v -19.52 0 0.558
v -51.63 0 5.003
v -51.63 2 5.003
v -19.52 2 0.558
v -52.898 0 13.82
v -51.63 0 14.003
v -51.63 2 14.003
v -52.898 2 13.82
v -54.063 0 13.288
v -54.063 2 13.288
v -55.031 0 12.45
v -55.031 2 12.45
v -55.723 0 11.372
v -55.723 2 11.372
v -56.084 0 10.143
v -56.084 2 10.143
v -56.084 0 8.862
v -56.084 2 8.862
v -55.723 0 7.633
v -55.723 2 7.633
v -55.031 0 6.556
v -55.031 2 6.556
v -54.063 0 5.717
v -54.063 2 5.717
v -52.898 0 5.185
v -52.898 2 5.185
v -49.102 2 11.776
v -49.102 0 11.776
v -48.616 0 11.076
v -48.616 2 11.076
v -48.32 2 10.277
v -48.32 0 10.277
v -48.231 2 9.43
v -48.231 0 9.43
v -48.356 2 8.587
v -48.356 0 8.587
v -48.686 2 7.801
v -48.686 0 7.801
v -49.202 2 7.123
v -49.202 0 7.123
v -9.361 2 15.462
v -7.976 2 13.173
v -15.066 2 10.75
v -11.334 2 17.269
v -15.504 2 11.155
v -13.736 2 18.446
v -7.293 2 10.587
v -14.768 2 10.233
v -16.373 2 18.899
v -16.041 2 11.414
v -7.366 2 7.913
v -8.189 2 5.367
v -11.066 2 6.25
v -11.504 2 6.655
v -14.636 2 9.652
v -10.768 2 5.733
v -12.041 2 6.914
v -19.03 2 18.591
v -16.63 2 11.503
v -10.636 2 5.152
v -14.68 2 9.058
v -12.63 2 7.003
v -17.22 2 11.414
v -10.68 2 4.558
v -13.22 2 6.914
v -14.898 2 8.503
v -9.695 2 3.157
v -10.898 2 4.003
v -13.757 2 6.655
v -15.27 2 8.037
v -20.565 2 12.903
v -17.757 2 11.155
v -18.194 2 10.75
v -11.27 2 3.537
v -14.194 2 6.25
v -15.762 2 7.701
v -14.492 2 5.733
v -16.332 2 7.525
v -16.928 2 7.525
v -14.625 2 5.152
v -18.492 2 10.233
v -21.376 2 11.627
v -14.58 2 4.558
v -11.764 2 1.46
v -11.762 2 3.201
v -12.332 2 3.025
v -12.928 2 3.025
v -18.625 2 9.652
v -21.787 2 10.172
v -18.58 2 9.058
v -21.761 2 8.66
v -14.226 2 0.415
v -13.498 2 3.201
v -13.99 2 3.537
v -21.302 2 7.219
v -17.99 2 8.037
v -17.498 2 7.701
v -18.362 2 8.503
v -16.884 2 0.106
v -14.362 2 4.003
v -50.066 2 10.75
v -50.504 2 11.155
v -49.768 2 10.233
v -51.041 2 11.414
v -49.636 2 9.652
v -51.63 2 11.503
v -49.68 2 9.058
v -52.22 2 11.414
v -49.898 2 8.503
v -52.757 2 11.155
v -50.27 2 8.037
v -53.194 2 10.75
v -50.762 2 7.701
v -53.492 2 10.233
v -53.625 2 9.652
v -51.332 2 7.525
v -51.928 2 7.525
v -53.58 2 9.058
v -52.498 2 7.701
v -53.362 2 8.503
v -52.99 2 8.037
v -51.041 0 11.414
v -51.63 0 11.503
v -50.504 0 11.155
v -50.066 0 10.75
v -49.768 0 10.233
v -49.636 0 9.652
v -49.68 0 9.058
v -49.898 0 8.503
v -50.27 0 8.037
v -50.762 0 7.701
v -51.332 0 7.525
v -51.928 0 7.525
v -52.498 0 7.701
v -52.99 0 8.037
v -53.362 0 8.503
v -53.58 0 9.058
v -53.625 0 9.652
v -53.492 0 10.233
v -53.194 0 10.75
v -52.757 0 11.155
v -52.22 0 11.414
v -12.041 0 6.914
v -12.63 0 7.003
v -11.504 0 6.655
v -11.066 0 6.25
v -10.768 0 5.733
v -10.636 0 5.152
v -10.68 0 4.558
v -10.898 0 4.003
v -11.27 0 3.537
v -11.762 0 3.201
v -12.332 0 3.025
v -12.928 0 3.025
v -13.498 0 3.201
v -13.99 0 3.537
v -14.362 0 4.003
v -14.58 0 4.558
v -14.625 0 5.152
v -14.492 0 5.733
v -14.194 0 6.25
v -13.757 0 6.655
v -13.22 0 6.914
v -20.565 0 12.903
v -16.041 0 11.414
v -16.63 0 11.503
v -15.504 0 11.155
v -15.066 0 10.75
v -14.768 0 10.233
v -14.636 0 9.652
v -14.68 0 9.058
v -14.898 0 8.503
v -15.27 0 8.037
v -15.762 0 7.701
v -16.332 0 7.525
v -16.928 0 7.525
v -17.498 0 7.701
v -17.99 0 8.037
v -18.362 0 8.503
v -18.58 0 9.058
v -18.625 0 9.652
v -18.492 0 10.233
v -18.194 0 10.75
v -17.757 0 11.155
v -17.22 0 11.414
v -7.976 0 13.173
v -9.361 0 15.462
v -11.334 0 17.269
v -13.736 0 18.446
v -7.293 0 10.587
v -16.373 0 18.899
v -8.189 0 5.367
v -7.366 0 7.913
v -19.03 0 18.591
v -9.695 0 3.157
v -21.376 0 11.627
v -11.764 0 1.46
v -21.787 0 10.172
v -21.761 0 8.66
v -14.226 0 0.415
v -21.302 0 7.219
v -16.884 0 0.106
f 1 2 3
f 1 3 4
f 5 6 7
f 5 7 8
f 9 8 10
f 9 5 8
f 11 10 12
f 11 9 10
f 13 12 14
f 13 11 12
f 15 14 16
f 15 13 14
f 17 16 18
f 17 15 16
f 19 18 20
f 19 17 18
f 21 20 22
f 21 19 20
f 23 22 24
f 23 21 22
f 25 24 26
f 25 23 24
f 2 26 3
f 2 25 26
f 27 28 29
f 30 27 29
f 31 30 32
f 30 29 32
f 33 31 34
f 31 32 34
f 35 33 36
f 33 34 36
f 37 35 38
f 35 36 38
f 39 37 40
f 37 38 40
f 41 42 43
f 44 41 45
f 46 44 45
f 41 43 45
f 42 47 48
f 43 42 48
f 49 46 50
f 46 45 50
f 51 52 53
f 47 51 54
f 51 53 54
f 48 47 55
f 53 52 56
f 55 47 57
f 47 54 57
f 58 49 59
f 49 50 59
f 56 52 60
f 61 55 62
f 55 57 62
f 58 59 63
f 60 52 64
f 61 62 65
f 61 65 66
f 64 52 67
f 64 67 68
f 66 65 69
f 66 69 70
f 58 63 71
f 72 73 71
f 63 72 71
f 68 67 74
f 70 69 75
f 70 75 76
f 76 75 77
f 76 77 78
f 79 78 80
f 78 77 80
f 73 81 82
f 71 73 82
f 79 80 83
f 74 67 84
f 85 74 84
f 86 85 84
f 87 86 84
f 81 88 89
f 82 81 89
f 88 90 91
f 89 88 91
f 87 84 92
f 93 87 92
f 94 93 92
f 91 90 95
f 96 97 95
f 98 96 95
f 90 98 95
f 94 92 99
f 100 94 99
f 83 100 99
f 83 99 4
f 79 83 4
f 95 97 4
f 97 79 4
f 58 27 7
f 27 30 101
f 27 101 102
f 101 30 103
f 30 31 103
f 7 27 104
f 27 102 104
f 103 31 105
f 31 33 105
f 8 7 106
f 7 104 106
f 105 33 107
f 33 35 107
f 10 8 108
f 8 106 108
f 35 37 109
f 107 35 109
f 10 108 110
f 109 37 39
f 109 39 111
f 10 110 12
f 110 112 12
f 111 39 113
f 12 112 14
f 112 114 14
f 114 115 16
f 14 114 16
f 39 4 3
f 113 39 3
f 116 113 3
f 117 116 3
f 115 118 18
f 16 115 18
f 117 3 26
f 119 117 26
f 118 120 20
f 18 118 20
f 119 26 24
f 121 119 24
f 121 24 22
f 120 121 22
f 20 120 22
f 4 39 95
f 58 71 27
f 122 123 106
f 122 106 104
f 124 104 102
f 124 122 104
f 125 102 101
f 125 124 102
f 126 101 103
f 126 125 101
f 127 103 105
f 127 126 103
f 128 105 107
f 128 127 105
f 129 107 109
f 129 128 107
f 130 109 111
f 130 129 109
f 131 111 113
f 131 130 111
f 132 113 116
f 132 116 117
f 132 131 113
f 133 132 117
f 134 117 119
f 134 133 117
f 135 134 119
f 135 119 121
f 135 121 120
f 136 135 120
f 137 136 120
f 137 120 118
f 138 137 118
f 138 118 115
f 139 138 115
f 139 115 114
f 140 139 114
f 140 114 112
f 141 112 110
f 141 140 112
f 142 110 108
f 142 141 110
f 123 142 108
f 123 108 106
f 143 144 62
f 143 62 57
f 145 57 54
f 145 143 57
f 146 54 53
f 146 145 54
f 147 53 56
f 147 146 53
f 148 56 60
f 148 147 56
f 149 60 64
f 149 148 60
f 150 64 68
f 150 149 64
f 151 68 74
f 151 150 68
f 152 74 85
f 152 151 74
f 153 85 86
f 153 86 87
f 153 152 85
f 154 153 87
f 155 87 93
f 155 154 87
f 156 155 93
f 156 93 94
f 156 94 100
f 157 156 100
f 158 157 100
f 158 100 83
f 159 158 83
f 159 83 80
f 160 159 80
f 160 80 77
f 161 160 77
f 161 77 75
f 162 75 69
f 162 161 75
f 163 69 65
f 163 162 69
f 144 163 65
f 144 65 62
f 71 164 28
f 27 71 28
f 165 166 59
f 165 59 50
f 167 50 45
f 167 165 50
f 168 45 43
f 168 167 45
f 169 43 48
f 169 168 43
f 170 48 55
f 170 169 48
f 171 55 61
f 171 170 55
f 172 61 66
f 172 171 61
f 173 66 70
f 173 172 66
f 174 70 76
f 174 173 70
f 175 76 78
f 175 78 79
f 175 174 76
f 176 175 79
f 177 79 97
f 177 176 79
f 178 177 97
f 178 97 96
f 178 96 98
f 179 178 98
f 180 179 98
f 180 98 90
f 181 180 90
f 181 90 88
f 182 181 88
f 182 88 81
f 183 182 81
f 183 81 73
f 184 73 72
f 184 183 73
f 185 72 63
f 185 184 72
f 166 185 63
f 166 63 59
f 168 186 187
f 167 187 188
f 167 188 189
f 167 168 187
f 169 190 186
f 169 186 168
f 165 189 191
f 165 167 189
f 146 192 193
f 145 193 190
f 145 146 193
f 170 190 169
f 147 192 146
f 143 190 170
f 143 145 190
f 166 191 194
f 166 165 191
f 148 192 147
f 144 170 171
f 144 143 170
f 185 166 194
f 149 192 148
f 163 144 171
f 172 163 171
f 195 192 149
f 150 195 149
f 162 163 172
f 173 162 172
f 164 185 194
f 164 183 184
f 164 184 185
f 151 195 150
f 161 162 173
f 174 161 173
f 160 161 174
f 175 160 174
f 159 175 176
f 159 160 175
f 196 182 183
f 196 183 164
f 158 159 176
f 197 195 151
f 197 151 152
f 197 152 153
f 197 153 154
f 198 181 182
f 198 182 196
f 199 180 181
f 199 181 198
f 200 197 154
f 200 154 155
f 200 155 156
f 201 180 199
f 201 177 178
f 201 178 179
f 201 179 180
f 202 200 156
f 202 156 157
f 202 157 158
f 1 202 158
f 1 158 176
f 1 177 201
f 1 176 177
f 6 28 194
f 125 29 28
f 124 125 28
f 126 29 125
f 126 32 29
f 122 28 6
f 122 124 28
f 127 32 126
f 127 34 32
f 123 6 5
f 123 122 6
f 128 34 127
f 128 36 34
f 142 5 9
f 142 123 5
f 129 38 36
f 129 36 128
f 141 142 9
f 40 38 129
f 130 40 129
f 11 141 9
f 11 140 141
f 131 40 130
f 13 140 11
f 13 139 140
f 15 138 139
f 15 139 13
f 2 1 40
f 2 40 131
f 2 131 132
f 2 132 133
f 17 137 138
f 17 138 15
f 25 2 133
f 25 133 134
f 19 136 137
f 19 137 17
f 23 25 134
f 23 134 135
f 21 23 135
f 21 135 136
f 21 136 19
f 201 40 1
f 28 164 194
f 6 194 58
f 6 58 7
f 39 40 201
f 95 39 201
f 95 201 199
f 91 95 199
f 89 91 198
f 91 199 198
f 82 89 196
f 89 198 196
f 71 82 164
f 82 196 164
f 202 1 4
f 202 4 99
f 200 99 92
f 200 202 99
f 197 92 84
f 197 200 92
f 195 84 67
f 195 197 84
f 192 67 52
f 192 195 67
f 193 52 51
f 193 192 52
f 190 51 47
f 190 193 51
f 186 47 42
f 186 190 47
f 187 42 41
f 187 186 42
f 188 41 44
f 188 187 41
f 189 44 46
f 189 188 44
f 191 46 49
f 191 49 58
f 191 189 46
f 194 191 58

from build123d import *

# Parameters (mm, degrees)
SKETCH1_R           = 2
BOSS_EXTRUDE1_DEPTH = 2


with BuildPart() as part:
    # Sketch1 → Boss-Extrude1 (new body)
    with BuildSketch(Plane(origin=(0, 0, 0), x_dir=(1, 0, 0), z_dir=(0, 1, 0))):
        with BuildLine():
            Line((-51.630151438, -5.002739553), (-19.52046035, -0.558125845))
            ThreePointArc((-19.52046035, -0.558125845), (-7.23362406, -9.247253291), (-19.030151438, -18.591193767))
            Line((-19.030151438, -18.591193767), (-51.630151438, -14.002739553))
            ThreePointArc((-51.630151438, -14.002739553), (-56.130151438, -9.502739553), (-51.630151438, -5.002739553))
        make_face()
        with Locations(Location((-16.630151438, -9.502739553, 0), (0, 0, 270))):
            Circle(SKETCH1_R, mode=Mode.SUBTRACT)
        with Locations(Location((-51.630151438, -9.502739553, 0), (0, 0, 270))):
            Circle(SKETCH1_R, mode=Mode.SUBTRACT)
        with Locations(Location((-12.630151438, -5.002739553, 0), (0, 0, 270))):
            Circle(SKETCH1_R, mode=Mode.SUBTRACT)
        with BuildLine():
            Line((-49.20201043, -7.122796016), (-21.30201043, -7.219379406))
            ThreePointArc((-21.30201043, -7.219379406), (-21.78692763, -10.171813025), (-20.564614553, -12.902739553))
            Line((-20.564614553, -12.902739553), (-49.10201043, -11.776173749))
            ThreePointArc((-49.10201043, -11.776173749), (-48.230936244, -9.429691213), (-49.20201043, -7.122796016))
        make_face(mode=Mode.SUBTRACT)
    extrude(amount=BOSS_EXTRUDE1_DEPTH)


solid = part.part
